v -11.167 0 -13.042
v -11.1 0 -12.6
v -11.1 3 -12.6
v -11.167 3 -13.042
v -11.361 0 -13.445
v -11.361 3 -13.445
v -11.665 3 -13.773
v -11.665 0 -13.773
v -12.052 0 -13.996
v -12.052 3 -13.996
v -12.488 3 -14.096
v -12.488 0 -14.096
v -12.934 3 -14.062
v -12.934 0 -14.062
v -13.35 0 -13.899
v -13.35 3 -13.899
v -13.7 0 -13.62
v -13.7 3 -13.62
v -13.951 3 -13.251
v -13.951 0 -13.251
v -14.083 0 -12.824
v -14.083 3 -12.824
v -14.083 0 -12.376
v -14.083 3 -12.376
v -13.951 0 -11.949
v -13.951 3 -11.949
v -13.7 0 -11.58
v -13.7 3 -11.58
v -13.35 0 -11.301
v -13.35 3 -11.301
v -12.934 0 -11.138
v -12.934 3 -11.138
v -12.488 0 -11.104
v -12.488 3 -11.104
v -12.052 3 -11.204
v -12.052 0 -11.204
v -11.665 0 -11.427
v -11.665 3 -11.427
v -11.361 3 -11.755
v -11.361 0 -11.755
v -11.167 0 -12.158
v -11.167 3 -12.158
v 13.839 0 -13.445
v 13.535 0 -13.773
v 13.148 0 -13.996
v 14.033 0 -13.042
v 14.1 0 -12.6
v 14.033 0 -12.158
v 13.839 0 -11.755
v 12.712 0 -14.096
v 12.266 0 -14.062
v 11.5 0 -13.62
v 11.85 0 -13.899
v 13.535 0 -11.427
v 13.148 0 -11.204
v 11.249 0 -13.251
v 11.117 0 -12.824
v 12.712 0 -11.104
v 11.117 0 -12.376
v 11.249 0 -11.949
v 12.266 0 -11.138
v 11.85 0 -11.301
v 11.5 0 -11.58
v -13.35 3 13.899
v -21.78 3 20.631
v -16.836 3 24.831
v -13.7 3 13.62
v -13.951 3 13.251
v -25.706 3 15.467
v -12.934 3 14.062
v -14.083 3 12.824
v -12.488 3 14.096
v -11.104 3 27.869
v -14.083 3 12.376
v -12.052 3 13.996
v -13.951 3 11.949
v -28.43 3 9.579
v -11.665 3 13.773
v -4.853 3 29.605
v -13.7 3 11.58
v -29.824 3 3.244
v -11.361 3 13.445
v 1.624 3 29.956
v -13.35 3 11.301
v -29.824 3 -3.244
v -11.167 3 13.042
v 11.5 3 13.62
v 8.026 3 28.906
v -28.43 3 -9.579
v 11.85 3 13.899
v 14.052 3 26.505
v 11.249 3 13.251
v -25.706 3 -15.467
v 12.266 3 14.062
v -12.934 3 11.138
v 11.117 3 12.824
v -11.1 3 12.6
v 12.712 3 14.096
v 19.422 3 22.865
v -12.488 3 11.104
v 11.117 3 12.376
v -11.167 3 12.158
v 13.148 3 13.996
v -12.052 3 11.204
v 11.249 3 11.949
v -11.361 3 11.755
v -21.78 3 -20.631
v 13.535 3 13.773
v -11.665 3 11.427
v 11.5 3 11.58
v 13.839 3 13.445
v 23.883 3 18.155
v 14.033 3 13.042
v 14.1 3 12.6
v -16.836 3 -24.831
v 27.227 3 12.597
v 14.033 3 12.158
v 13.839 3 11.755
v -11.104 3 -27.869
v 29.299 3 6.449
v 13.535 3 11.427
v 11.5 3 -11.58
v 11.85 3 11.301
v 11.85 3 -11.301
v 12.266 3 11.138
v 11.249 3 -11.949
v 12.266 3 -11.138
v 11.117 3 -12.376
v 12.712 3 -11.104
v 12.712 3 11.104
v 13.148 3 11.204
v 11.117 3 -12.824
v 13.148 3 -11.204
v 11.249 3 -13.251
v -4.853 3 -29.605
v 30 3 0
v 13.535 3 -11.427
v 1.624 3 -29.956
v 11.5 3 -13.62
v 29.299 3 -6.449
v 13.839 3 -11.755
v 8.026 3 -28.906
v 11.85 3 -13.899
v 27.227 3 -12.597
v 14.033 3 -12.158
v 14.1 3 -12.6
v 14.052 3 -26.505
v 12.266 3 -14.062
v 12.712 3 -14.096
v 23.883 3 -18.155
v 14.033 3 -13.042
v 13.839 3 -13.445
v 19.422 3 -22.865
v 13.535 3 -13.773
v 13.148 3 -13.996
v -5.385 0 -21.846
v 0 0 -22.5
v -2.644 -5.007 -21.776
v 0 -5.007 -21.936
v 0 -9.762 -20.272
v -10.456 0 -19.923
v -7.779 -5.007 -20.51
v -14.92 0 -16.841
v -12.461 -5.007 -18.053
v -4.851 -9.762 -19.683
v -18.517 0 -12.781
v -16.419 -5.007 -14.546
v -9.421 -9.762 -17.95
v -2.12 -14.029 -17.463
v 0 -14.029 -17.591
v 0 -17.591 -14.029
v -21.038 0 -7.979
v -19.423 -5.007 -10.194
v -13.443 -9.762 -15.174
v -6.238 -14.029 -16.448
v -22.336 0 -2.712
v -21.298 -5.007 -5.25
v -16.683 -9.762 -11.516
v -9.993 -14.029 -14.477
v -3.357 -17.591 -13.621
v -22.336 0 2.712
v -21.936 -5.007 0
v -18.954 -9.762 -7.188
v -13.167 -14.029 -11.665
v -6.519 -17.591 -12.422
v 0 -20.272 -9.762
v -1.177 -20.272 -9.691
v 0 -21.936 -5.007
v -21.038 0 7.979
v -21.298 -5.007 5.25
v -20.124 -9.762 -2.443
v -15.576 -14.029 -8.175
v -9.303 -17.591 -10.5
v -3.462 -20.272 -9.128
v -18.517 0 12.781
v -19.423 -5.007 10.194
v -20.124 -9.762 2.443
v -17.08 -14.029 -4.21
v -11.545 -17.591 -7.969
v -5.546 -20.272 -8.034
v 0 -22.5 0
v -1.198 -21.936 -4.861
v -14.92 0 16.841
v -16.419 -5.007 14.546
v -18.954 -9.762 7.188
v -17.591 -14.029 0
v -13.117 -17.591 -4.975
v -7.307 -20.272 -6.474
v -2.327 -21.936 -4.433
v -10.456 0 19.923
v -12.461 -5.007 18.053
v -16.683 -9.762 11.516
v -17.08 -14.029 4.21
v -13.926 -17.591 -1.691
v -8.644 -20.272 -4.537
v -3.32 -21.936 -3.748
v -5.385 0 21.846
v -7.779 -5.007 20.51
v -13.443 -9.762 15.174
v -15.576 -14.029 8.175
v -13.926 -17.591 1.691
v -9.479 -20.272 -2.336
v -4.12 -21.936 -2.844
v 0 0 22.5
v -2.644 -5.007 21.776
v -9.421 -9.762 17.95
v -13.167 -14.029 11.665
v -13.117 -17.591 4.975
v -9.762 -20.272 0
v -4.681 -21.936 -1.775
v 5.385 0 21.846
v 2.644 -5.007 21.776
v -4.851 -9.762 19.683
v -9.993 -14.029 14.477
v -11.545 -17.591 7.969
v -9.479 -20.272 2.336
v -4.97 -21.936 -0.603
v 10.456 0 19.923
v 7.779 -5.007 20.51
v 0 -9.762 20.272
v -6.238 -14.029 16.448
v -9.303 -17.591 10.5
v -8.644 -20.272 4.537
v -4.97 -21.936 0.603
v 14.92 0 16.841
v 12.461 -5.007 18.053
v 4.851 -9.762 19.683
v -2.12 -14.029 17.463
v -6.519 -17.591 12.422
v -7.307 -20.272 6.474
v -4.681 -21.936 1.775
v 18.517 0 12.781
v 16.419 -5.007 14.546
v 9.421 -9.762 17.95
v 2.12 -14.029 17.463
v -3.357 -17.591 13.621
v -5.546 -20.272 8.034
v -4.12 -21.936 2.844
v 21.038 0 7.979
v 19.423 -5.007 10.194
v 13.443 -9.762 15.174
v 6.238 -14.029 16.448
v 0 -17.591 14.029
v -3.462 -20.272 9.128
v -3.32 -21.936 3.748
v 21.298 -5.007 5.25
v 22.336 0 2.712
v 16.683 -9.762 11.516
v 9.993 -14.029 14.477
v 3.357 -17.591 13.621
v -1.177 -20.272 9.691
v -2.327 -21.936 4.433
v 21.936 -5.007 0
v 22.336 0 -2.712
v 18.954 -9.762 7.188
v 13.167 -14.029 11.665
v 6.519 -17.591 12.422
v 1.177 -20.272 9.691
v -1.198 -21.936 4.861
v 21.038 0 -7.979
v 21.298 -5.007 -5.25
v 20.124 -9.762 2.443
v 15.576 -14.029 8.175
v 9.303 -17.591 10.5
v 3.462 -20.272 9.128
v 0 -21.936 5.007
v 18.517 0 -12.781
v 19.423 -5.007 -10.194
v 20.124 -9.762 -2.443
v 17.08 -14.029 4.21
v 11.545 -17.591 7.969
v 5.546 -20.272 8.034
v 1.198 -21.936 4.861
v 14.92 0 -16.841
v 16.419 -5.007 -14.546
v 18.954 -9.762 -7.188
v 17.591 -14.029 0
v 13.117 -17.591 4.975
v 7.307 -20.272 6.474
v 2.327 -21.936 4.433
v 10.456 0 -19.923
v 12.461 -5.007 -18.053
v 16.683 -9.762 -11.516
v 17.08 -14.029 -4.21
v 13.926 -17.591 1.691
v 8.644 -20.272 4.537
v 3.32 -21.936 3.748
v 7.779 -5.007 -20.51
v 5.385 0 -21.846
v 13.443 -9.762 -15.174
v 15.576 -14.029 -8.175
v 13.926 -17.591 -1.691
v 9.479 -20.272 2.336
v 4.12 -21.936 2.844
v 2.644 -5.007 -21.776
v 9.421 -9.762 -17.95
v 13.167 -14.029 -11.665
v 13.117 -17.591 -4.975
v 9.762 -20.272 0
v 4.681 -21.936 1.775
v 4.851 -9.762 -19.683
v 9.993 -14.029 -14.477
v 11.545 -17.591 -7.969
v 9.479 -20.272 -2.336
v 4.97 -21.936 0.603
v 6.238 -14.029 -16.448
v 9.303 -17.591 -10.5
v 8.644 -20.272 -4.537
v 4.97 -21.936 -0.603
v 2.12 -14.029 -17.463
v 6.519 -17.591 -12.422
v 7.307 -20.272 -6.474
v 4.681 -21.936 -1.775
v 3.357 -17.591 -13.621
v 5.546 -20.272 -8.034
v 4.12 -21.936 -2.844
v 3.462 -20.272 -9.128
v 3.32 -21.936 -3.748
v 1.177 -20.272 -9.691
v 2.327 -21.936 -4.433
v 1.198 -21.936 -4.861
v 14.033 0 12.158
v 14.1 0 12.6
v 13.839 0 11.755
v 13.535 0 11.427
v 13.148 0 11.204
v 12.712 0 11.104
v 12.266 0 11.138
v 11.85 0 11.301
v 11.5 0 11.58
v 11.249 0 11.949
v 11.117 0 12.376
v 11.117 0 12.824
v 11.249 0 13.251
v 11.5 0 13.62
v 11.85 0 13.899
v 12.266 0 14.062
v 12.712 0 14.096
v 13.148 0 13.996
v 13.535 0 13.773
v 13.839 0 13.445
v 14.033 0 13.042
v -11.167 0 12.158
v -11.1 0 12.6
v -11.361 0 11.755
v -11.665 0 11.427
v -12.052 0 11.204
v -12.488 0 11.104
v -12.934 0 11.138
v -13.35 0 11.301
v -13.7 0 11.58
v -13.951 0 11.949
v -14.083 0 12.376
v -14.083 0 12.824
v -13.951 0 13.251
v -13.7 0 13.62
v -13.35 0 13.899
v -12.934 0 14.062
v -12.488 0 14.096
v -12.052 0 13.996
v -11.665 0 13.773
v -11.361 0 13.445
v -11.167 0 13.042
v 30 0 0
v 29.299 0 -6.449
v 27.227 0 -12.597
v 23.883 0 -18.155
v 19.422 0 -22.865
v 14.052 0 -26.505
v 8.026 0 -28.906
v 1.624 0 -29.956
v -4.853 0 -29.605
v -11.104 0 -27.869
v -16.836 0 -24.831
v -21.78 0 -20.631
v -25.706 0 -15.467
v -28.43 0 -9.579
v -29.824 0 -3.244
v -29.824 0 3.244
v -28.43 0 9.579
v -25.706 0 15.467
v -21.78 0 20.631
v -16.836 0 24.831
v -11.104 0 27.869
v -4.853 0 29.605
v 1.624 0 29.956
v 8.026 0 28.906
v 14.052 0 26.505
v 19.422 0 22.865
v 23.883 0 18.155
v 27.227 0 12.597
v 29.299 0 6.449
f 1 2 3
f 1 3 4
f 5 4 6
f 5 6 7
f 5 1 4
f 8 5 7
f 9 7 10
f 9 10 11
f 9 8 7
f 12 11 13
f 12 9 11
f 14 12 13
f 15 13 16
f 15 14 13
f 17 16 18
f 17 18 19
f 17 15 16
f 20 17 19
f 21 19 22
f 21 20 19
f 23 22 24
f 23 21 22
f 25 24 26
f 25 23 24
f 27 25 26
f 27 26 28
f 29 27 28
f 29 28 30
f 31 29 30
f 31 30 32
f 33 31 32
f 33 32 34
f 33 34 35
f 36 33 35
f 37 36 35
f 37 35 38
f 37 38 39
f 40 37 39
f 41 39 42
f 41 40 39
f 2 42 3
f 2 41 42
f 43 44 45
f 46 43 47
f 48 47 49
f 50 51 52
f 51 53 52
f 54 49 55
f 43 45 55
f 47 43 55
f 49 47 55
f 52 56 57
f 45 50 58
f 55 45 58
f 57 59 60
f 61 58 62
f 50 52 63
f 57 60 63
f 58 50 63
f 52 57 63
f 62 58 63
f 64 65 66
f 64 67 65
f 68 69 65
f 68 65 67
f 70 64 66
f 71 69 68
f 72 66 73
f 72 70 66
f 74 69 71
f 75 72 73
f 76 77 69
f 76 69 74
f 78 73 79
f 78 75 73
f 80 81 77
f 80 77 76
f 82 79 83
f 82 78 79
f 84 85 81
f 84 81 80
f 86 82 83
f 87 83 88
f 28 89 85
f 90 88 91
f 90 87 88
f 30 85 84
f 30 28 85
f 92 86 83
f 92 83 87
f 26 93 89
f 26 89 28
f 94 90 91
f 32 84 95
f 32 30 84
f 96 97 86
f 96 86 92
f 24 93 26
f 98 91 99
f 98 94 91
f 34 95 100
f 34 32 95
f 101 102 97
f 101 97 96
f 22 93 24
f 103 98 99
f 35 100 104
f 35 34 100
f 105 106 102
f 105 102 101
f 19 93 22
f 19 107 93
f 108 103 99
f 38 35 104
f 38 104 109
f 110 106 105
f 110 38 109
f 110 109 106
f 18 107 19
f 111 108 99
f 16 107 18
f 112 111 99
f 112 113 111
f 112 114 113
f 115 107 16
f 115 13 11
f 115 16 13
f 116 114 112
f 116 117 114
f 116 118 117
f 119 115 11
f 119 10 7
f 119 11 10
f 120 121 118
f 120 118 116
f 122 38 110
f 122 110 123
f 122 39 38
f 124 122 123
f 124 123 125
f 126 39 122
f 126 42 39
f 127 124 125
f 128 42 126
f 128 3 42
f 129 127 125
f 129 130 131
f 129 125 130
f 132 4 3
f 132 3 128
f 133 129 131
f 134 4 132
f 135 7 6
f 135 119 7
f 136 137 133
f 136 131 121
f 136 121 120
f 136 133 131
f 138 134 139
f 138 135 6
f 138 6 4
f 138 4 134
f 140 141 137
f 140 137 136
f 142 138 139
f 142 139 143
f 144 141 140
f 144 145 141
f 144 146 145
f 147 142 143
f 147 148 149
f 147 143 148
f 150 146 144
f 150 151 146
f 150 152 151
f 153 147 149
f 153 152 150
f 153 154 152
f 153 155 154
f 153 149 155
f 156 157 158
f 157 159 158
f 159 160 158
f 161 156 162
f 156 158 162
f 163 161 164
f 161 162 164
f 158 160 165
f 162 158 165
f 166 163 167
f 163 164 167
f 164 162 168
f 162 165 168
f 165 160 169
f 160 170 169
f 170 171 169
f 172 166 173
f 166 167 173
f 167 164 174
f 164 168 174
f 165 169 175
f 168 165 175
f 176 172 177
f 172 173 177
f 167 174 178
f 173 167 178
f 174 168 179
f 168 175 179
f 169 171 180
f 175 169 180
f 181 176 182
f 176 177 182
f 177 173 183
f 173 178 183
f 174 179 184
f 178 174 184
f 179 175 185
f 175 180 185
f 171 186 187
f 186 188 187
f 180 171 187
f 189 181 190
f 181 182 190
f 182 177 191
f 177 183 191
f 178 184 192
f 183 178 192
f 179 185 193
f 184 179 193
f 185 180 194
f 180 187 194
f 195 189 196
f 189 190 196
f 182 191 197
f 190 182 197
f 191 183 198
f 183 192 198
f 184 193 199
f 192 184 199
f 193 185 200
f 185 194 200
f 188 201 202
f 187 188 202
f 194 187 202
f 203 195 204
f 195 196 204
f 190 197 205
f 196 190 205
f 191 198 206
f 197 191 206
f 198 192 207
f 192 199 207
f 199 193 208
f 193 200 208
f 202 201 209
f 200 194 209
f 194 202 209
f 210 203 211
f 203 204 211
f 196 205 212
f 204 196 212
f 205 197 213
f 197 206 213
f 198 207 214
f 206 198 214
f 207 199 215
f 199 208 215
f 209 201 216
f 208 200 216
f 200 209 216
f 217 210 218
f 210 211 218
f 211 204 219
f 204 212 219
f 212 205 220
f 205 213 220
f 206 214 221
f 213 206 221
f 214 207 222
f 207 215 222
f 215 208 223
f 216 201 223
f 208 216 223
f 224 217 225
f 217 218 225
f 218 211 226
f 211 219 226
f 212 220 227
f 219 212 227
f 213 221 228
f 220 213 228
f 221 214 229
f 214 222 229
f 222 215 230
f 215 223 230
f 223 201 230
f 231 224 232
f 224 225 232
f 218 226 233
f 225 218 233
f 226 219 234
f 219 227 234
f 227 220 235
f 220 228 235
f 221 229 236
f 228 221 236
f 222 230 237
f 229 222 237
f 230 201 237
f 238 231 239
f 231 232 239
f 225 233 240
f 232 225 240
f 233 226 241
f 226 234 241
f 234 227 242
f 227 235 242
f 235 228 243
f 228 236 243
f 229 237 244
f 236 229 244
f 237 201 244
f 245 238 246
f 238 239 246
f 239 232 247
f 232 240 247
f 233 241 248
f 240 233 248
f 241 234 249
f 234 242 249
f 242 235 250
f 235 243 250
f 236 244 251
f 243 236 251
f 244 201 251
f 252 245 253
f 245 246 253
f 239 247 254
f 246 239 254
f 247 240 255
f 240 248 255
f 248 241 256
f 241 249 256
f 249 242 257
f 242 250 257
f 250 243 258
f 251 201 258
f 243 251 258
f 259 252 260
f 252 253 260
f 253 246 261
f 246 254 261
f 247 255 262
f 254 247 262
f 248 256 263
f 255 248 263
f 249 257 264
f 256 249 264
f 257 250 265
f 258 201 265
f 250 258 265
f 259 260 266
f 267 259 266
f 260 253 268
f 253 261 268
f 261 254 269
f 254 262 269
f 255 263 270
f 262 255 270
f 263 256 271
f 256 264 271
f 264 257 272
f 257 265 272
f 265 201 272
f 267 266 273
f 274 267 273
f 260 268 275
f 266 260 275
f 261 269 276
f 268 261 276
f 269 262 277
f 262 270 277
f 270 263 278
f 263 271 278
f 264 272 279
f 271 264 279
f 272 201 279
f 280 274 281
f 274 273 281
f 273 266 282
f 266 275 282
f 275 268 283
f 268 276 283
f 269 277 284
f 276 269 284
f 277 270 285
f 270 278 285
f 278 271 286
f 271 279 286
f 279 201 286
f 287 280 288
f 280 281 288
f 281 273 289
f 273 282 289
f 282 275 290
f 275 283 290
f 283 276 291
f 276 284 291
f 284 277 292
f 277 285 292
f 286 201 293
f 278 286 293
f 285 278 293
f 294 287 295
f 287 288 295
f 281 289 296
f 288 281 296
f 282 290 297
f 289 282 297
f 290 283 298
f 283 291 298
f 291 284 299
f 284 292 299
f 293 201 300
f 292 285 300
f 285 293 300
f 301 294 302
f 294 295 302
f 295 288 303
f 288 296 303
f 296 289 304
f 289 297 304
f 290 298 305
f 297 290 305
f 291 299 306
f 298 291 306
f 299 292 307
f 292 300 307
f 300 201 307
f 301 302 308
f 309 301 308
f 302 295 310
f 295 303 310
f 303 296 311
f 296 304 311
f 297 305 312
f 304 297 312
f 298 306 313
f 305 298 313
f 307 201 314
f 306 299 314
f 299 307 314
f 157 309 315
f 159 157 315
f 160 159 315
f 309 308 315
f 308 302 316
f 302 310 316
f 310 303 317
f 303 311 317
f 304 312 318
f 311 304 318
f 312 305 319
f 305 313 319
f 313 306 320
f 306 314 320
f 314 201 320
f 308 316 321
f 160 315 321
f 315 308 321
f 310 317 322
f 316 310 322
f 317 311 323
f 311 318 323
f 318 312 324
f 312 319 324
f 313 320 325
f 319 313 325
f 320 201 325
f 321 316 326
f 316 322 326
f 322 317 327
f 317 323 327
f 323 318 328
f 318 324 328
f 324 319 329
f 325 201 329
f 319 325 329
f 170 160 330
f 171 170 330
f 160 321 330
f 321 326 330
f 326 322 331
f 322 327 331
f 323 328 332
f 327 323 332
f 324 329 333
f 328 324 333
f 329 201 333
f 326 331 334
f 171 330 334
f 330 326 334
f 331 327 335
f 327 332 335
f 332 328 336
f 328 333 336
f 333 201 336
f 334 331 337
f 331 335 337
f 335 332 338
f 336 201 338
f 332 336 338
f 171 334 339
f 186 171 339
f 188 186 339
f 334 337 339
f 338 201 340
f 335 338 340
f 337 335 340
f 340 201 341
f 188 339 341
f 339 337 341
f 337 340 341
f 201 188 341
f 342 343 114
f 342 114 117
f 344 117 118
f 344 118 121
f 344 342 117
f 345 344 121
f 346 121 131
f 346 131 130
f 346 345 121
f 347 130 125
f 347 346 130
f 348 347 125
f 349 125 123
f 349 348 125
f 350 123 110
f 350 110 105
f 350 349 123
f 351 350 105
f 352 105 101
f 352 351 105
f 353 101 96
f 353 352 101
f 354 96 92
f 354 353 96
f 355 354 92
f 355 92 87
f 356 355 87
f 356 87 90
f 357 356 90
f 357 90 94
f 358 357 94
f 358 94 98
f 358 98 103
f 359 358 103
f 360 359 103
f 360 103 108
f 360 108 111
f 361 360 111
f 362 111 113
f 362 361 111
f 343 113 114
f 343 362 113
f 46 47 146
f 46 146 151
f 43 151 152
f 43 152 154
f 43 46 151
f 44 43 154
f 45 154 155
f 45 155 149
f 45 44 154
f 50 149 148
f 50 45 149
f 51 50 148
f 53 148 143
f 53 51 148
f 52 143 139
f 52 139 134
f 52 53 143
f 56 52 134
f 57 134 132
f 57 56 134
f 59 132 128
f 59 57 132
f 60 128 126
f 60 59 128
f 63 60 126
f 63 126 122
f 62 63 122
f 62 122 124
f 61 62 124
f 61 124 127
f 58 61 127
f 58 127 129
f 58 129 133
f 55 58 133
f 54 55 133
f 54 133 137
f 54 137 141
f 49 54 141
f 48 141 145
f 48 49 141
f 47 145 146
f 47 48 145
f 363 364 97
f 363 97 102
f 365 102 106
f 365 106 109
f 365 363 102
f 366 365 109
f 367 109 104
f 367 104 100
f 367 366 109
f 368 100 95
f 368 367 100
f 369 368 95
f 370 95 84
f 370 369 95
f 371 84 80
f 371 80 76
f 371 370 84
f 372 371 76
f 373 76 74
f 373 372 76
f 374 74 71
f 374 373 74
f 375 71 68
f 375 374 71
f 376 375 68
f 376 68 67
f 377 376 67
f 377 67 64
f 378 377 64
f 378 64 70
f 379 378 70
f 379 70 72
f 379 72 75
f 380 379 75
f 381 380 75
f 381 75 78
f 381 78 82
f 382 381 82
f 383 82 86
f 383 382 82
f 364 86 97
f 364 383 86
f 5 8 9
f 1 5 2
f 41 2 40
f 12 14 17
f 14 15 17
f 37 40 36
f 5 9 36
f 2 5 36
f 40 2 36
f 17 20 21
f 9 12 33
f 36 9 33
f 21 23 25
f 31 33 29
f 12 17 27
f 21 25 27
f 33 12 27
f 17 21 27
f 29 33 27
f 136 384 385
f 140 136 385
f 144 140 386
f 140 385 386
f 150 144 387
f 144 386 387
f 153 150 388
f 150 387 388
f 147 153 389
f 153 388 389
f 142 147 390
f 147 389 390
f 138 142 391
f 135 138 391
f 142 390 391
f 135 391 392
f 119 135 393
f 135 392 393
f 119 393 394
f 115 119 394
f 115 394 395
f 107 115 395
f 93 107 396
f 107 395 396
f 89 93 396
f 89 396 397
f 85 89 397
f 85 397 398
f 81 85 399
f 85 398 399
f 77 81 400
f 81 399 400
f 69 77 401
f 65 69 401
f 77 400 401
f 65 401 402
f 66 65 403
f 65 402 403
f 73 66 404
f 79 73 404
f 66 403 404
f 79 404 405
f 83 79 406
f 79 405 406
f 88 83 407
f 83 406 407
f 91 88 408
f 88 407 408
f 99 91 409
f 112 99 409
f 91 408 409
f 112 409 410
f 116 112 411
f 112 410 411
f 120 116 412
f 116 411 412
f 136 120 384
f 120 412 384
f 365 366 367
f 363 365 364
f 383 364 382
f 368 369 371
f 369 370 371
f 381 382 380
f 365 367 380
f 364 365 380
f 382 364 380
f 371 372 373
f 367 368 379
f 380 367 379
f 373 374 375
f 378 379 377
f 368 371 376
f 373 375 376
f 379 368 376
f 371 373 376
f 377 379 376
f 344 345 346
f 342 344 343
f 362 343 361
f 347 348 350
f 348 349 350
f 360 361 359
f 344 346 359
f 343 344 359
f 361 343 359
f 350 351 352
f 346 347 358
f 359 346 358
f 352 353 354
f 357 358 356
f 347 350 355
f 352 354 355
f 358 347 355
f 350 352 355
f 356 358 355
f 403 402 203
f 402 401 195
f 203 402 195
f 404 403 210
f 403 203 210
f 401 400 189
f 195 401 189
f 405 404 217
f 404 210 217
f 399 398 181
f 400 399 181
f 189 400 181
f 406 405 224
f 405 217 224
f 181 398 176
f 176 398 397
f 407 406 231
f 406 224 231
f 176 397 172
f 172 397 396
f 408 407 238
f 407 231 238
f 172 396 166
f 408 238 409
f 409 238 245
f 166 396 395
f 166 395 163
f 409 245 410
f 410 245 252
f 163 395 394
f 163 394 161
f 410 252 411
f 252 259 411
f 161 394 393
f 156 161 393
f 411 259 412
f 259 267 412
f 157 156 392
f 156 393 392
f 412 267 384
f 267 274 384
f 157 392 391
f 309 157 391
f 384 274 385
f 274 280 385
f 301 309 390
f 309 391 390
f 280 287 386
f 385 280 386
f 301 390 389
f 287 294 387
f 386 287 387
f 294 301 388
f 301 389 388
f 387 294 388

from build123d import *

# Parameters (mm, degrees)
SKETCH_1_R      = 30
SKETCH_1_R_2    = 1.5
EXTRUDE_1_DEPTH = 3


with BuildPart() as part:
    # 草图1 → 凸台-拉伸1 (new body)
    with BuildSketch(Plane(origin=(0, 0, 0), x_dir=(1, 0, 0), z_dir=(0, 1, 0))):
        Circle(SKETCH_1_R)
        with Locations((-12.6, 12.6)):
            Circle(SKETCH_1_R_2, mode=Mode.SUBTRACT)
        with Locations((12.6, 12.6)):
            Circle(SKETCH_1_R_2, mode=Mode.SUBTRACT)
        with Locations((12.6, -12.6)):
            Circle(SKETCH_1_R_2, mode=Mode.SUBTRACT)
        with Locations((-12.6, -12.6)):
            Circle(SKETCH_1_R_2, mode=Mode.SUBTRACT)
    extrude(amount=EXTRUDE_1_DEPTH)

    # 草图3 → 旋转1 (revolve)
    with BuildSketch(Plane(origin=(0, 0, 0), x_dir=(0, 0, -1), z_dir=(1, 0, 0))):
        with BuildLine():
            Line((0, -22.5), (0, 0))
            Line((0, 0), (22.5, 0))
            ThreePointArc((22.5, 0), (15.909902577, -15.909902577), (0, -22.5))
        make_face()
    revolve(axis=Axis((0, 15, 0), (0, 1, 0)))


solid = part.part
